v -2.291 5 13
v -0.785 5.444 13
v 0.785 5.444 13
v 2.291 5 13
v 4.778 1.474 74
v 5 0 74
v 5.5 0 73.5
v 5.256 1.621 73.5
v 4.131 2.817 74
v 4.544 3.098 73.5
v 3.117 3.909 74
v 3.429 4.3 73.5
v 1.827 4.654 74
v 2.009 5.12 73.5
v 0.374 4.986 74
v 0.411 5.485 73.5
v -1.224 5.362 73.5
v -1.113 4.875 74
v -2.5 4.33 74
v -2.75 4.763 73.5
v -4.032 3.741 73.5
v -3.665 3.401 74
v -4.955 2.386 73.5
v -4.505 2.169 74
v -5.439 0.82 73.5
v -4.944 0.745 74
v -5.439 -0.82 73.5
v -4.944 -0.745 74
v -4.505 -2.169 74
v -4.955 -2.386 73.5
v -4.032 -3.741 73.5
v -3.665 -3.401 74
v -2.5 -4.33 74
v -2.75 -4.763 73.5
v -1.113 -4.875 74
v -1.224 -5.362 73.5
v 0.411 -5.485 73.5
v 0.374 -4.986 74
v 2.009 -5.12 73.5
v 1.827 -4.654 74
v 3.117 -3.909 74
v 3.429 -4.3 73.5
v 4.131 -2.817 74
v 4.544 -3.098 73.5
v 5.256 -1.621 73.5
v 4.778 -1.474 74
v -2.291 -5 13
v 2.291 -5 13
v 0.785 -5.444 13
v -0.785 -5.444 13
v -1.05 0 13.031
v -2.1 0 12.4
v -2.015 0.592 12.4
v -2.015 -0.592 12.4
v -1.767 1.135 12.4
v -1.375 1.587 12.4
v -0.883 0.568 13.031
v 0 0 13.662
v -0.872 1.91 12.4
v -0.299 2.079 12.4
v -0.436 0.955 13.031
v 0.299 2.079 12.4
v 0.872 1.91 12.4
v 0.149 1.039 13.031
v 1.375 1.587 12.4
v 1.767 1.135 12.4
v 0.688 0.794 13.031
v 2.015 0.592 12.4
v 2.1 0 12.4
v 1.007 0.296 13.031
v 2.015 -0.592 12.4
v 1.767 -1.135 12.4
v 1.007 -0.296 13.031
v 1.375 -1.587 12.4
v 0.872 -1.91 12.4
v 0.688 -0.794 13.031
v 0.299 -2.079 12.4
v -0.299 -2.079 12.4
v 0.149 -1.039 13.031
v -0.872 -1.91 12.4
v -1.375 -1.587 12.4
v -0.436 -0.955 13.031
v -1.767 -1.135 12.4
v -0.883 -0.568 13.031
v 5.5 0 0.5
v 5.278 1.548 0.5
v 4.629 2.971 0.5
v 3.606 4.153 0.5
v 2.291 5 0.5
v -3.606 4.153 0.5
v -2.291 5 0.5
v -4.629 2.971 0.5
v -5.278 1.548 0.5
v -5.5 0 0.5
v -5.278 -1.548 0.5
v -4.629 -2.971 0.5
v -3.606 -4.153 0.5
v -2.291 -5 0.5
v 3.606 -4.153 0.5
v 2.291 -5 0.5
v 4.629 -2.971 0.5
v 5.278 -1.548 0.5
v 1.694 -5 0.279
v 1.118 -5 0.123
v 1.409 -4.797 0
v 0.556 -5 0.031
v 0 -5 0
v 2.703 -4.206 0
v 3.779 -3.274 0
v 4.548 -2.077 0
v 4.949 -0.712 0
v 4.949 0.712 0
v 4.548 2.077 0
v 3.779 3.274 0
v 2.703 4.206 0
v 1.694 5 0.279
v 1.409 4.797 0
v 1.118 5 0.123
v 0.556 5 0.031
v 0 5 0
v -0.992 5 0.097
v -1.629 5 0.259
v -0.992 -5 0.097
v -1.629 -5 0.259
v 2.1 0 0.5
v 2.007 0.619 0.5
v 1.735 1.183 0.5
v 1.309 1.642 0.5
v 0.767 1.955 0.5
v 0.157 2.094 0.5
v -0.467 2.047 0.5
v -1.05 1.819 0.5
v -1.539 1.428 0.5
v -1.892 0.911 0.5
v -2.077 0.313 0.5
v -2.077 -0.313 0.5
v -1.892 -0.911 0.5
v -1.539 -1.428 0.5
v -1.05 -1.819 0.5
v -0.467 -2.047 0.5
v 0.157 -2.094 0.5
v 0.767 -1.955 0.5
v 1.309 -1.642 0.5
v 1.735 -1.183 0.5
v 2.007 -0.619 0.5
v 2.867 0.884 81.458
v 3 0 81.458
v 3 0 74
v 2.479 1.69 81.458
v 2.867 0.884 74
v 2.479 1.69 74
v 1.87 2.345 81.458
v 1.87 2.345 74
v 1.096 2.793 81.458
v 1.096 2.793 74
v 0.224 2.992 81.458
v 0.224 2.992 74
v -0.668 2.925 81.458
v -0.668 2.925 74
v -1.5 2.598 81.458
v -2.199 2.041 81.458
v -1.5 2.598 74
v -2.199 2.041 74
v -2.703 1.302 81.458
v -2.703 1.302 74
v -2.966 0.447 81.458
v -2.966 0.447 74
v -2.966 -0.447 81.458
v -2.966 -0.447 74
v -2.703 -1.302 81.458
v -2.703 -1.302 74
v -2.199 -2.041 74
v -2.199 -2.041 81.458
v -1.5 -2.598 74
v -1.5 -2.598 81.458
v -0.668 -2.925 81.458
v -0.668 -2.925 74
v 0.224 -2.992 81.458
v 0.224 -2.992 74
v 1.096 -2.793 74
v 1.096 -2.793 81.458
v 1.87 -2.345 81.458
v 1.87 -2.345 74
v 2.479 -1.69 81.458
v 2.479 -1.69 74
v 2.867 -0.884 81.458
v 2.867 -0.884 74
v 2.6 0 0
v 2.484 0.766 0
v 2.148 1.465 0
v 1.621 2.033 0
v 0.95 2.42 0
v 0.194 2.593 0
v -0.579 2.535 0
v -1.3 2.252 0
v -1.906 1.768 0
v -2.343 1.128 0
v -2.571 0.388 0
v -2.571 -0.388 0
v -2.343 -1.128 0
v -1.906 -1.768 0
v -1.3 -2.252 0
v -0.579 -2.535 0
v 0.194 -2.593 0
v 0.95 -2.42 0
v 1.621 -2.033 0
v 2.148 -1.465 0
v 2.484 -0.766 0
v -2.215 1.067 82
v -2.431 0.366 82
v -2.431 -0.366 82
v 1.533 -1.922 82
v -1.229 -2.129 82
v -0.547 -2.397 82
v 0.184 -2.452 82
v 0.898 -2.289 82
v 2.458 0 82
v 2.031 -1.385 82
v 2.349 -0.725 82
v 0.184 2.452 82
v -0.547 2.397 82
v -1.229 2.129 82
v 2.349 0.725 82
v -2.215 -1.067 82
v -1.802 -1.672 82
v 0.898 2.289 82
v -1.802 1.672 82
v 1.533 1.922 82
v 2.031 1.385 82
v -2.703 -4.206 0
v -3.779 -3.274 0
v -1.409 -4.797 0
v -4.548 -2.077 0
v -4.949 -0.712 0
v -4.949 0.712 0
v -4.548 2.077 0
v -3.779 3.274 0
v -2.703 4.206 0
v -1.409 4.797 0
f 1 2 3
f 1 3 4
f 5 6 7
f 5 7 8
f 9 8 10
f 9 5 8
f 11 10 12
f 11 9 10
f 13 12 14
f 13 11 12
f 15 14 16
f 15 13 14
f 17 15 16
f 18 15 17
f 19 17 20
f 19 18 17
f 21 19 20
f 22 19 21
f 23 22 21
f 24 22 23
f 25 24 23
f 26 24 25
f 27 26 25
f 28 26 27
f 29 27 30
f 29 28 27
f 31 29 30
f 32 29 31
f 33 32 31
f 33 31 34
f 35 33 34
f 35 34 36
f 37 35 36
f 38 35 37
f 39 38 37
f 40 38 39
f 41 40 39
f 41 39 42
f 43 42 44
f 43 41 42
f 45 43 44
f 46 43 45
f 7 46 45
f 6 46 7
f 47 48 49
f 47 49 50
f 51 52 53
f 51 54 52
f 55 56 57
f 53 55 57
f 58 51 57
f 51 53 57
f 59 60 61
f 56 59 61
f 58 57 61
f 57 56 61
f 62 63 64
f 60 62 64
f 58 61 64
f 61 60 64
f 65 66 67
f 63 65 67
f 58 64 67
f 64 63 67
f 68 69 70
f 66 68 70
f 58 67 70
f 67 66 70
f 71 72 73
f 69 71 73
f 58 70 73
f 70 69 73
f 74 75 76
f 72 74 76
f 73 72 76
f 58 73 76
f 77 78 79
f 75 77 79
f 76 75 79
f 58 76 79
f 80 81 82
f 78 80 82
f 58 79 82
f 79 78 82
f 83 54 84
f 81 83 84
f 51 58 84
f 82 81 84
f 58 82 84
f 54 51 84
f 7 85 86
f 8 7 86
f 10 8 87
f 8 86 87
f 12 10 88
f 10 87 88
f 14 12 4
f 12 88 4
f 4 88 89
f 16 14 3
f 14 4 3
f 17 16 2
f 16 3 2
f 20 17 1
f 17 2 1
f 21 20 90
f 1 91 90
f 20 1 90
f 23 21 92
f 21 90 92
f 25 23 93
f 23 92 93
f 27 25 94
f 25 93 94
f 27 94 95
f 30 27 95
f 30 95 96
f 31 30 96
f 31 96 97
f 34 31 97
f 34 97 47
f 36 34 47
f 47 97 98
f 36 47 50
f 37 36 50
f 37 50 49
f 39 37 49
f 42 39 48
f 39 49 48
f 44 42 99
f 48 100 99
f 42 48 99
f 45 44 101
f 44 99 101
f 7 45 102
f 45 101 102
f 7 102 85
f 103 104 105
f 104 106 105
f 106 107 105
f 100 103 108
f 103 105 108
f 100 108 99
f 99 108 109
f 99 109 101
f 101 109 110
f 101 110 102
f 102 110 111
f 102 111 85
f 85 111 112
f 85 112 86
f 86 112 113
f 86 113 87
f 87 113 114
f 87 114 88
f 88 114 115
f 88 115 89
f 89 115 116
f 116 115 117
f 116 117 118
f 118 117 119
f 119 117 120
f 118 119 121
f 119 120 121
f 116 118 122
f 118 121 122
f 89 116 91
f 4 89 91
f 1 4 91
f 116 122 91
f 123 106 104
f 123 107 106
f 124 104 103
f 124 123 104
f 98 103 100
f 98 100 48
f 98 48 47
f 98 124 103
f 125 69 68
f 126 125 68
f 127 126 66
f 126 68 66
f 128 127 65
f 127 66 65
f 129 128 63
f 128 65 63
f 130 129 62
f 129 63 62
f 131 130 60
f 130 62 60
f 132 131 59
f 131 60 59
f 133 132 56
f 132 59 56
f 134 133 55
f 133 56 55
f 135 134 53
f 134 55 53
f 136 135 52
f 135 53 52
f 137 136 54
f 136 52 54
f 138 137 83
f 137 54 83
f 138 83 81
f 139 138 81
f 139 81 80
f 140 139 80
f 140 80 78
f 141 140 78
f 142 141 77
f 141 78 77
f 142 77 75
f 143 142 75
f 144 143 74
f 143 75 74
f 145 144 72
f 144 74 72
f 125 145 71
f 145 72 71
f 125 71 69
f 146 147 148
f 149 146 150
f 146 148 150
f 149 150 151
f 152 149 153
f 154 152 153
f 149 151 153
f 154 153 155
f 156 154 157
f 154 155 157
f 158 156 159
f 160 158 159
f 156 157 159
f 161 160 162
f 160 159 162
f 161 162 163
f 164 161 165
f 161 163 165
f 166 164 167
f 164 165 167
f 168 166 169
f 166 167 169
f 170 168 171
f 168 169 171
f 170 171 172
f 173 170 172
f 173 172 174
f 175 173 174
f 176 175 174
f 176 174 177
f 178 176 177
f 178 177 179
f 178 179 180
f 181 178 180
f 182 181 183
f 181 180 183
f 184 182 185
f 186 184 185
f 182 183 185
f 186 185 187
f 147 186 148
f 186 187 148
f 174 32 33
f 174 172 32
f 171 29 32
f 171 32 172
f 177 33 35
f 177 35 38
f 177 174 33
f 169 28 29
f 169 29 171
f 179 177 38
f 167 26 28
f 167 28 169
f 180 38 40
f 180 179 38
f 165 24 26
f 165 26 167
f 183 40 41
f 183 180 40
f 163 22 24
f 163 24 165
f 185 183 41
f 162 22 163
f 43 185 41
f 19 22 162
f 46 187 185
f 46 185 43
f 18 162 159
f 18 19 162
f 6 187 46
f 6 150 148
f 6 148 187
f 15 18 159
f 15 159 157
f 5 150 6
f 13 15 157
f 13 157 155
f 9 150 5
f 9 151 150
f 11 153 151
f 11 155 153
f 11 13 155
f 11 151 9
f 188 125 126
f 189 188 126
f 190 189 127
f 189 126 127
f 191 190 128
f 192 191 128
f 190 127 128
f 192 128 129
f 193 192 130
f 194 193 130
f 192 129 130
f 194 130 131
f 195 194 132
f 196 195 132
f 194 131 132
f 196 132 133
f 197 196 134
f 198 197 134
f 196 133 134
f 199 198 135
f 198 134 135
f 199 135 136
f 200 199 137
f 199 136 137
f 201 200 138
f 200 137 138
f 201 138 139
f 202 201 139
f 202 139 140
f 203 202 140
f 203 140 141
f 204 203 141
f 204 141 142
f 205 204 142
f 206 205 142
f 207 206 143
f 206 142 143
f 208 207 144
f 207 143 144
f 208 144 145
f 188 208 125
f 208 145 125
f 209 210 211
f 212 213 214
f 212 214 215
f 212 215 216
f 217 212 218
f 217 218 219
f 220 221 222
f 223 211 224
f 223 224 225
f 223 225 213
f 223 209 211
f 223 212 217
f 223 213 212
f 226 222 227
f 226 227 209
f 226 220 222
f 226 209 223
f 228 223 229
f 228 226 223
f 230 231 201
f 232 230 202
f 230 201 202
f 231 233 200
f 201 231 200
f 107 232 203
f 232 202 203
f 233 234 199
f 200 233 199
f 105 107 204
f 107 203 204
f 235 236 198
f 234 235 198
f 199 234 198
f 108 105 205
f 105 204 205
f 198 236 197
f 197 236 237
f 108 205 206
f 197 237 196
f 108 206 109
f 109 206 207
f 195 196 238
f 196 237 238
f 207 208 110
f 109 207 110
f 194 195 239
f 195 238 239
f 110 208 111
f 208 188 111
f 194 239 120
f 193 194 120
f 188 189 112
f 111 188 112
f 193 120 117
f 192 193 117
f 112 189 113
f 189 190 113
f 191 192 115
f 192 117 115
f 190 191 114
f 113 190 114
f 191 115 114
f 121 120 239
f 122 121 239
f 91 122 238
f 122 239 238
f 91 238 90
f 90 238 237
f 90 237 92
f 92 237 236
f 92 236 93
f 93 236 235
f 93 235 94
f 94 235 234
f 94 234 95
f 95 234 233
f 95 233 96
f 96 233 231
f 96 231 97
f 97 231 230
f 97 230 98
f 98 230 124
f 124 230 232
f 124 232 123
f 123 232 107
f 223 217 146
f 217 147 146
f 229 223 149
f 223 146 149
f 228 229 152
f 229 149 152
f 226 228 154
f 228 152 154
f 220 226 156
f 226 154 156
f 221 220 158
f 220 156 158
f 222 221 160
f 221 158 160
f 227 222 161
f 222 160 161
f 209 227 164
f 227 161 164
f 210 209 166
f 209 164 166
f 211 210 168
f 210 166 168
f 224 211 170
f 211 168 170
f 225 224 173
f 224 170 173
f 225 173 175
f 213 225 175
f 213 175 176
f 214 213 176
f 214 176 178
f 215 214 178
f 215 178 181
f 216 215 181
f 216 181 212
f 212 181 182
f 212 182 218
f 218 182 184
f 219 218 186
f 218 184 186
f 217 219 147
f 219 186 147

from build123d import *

# Parameters (mm, degrees)
SKETCH_1_R             = 5.5
EXTRUDE_1_DEPTH        = 74
CHAMFER_1_SIZE         = 0.5
SKETCH_2_R             = 3.3
EXTRUDE_2_DEPTH        = 8
HOLE_WIZARD_M5_1_D     = 4.2
HOLE_WIZARD_M5_1_DEPTH = 12.4
HOLE_WIZARD_M5_1_TIP   = 1.2618073
CHAMFER_3_SIZE         = 0.5
SKETCH_6_W             = 10
SKETCH_6_H             = 3
CUT_EXTRUDE_1_DEPTH    = 13


# Read off the part's stored shape, not the designer's step: M6 机械螺纹 螺柱1
with BuildPart() as part:
    # 草图1 → 拉伸1 (new body)
    with BuildSketch(Plane.XY):
        Circle(SKETCH_1_R)
    extrude(amount=EXTRUDE_1_DEPTH)

    # 倒角1
    chamfer_1_edges = [part.edges().sort_by_distance(p)[0] for p in [
        (-5.5, 0, 0),
        (-5.5, 0, 74),
    ]]
    chamfer(chamfer_1_edges, length=CHAMFER_1_SIZE)

    # 草图2 → 拉伸2 (add)
    with BuildSketch(Plane.XY.offset(74)):
        Circle(SKETCH_2_R)
    extrude(amount=EXTRUDE_2_DEPTH)

    # M5 螺纹孔1
    with Locations(Plane(origin=(0, 0, 0), x_dir=(-1, 0, 0), z_dir=(0, 0, -1))):
        with Locations((0, 0)):
            Hole(HOLE_WIZARD_M5_1_D / 2, depth=HOLE_WIZARD_M5_1_DEPTH)
            with Locations((0, 0, -(HOLE_WIZARD_M5_1_DEPTH + HOLE_WIZARD_M5_1_TIP / 2))):  # 118° drill point
                Cone(0, HOLE_WIZARD_M5_1_D / 2, HOLE_WIZARD_M5_1_TIP, mode=Mode.SUBTRACT)

    # 倒角3
    chamfer_3_edges = [part.edges().sort_by_distance(p)[0] for p in [
        (-2.1, 0, 0),
    ]]
    chamfer(chamfer_3_edges, length=CHAMFER_3_SIZE)

    # 草图6 → 切除-拉伸1 (cut)
    with BuildSketch(Plane(origin=(0, 0, 0), x_dir=(-1, 0, 0), z_dir=(0, 0, -1))):
        with Locations((0, 6.5)):
            Rectangle(SKETCH_6_W, SKETCH_6_H)
        with Locations((0, -6.5)):
            Rectangle(SKETCH_6_W, SKETCH_6_H)
    extrude(amount=-CUT_EXTRUDE_1_DEPTH, mode=Mode.SUBTRACT)

    # M6 机械螺纹 螺柱1 outline → M6 机械螺纹 螺柱1 (revolve, cut)
    with BuildSketch(Plane.XZ):
        Polygon((3.3, 82), (2.4585, 82), (3, 81.4585), (3, 74), (3.3, 74), align=None)
    revolve(axis=Axis((0, 0, 0), (0, 0, 1)), mode=Mode.SUBTRACT)


solid = part.part
